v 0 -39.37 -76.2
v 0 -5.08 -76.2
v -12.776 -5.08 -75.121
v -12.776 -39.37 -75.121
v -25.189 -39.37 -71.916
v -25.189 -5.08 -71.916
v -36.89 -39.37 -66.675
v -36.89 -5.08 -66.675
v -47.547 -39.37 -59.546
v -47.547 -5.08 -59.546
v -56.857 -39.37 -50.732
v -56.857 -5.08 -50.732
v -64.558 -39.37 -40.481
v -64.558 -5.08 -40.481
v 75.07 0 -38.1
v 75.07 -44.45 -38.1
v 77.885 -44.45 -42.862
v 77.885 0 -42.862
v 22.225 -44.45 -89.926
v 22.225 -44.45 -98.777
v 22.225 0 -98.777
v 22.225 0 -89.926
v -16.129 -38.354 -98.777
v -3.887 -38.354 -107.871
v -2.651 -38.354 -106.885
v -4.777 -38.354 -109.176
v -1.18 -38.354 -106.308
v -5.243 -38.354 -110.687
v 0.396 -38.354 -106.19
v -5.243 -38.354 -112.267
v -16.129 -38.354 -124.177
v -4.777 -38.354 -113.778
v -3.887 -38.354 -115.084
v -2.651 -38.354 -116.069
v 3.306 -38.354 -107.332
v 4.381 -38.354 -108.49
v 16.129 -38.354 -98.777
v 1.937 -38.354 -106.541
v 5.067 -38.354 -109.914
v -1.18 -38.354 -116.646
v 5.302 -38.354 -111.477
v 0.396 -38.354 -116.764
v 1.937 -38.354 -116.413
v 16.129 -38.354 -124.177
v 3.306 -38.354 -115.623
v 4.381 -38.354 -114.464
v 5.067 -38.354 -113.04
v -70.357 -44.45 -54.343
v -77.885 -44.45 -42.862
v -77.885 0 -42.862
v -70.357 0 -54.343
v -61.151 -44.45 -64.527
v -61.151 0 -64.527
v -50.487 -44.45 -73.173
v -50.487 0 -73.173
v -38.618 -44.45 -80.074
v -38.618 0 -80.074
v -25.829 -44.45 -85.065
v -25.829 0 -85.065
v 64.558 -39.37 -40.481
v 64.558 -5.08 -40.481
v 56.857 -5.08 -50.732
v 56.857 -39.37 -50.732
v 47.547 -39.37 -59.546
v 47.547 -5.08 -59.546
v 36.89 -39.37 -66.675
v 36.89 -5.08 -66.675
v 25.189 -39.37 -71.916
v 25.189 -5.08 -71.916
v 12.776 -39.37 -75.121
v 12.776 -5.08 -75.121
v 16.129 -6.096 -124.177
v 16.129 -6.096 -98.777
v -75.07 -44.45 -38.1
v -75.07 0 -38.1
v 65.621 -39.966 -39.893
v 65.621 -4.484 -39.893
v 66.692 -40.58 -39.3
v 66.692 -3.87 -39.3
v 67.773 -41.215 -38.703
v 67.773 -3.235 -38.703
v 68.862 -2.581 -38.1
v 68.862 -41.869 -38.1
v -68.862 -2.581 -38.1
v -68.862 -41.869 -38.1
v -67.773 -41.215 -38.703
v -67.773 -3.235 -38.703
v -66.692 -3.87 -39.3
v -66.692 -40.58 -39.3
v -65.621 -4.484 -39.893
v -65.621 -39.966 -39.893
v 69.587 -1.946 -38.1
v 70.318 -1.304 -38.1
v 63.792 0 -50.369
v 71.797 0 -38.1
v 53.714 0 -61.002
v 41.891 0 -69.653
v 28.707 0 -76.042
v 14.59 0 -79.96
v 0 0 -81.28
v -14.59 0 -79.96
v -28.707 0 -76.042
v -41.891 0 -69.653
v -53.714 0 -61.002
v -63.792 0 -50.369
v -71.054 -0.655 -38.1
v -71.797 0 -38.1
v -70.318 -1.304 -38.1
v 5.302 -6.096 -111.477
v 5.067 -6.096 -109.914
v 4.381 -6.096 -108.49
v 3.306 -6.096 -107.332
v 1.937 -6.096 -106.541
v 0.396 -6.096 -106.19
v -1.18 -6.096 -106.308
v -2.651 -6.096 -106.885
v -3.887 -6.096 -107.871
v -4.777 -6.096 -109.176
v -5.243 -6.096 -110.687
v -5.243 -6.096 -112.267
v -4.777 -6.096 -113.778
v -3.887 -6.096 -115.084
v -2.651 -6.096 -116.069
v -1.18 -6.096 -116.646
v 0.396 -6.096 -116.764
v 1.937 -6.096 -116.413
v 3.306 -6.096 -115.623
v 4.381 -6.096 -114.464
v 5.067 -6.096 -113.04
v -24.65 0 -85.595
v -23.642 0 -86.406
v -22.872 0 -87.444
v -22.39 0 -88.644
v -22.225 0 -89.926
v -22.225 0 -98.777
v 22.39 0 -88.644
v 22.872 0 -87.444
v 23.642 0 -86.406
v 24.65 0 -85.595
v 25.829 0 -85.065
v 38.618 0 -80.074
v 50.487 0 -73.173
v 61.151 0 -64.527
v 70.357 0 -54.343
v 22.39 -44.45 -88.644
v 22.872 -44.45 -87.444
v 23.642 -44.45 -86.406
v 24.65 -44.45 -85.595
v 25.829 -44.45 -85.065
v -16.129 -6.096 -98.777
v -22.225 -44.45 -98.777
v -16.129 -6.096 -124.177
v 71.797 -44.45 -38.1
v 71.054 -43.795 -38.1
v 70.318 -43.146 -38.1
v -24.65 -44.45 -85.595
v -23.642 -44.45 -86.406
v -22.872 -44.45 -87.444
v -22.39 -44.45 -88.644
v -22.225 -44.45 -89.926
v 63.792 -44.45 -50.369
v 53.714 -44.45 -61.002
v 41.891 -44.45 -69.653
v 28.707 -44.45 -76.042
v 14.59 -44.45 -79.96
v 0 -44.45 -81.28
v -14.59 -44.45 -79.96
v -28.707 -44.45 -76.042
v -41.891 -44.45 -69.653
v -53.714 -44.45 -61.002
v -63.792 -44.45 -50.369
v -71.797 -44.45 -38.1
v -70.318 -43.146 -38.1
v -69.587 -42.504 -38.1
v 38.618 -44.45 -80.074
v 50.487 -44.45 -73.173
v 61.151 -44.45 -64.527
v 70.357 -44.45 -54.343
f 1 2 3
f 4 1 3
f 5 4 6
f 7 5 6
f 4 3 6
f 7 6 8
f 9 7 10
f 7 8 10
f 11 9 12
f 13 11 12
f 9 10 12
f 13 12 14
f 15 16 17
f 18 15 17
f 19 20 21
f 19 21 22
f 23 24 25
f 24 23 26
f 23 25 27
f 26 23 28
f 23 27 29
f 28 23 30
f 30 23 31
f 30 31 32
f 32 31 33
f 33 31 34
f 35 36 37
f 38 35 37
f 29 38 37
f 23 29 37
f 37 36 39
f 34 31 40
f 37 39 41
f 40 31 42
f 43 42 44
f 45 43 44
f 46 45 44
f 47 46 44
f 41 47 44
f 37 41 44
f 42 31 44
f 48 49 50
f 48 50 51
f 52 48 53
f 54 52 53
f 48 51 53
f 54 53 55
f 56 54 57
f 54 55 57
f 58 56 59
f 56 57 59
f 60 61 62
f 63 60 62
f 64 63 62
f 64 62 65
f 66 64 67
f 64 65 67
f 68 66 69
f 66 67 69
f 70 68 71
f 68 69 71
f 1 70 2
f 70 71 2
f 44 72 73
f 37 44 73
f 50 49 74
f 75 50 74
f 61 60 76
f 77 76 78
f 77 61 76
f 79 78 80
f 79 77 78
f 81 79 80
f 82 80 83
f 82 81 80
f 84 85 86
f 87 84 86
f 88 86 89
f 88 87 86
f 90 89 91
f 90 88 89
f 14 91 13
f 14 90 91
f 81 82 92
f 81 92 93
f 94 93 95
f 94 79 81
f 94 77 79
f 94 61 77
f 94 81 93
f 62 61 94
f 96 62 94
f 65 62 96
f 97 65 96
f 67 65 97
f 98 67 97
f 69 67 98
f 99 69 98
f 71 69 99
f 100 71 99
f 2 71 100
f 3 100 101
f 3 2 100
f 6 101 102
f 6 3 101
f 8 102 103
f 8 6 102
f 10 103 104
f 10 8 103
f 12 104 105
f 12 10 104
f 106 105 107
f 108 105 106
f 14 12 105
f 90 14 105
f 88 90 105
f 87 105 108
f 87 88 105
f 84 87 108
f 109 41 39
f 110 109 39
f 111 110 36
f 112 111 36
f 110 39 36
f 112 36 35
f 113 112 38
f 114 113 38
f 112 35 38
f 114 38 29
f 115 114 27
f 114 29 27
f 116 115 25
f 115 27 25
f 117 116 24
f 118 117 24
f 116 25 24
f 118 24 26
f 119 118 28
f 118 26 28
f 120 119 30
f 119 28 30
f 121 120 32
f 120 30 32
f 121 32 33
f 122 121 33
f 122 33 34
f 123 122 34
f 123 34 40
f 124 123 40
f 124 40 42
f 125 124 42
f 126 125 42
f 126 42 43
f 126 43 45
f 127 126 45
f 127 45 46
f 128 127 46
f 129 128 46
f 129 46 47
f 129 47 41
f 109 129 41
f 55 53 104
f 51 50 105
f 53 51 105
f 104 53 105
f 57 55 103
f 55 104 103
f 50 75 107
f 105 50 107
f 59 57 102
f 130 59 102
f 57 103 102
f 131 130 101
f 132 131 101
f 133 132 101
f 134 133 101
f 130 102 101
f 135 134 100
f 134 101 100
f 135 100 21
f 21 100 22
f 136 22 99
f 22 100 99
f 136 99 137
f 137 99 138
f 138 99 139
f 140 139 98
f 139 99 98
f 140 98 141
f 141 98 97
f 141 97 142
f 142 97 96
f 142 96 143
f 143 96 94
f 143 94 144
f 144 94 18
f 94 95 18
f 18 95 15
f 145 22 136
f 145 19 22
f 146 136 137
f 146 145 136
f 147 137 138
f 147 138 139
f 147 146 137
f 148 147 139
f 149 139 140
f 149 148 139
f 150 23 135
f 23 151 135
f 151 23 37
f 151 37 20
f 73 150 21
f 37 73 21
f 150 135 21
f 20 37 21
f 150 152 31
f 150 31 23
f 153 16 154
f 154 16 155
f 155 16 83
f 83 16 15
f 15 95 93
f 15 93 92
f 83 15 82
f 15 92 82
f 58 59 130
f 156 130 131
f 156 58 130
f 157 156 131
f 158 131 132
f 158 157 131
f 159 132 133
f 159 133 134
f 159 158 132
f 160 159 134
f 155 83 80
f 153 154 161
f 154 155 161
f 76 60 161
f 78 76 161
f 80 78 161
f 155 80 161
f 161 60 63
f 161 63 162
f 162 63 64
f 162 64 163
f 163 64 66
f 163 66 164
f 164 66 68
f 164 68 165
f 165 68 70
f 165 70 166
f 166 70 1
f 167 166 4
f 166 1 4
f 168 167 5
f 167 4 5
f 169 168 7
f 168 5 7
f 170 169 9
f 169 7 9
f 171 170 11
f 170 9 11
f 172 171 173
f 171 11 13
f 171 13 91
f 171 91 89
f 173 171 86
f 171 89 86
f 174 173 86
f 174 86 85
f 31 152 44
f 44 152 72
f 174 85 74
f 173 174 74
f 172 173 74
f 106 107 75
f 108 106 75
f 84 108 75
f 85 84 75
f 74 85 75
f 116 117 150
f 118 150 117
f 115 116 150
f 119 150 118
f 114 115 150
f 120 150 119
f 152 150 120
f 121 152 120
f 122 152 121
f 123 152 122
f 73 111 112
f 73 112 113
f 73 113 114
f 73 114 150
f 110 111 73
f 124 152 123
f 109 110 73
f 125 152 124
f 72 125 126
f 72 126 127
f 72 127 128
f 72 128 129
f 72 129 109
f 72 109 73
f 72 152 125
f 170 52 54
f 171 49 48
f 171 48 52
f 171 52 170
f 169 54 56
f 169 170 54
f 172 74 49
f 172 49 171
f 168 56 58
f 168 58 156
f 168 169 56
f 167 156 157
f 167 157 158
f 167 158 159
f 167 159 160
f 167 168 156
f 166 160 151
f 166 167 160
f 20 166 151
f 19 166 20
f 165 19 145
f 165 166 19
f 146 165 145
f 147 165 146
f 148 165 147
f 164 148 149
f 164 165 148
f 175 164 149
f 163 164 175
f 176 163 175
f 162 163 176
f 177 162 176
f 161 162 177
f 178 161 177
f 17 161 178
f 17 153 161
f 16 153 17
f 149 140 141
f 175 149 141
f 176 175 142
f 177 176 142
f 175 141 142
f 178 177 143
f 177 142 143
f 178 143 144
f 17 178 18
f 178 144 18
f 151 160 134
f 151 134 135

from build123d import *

# Parameters (mm, degrees)
F0_W        = 16.129
F0_H        = 25.4
F1_DEPTH    = 44.45
F2_W        = 32.258
F2_H        = 6.096
F3_DEPTH    = 25.4
F4_R        = 5.30225
F5_DEPTH    = 38.355
F6_R        = 5.08
F7_T1_DEPTH = 59.6994752683
F7_T4_ANGLE = 139.6602442287
F7_T6_ANGLE = 139.6602442287
F8_T1_DEPTH = 71.752763855


# Not quite as in the source:
# - a fillet or chamfer that OpenCascade refuses, or shapes differently, is made with other operations: its cross-section is extruded or revolved along the edge and cut away or added


with BuildPart() as f1:
    # F0 (on Front) → F1 (new body)
    with BuildSketch(Plane.XZ):
        with BuildLine():
            ThreePointArc((0, -76.2), (-38.1, -65.9911357684), (-65.9911357684, -38.1))
            Line((-65.9911357684, -38.1), (-80.3218525683, -38.1))
            ThreePointArc((-80.3218525683, -38.1), (-56.6075409411, -68.5477666201), (-22.225, -86.0770548695))
            Line((-22.225, -86.0770548695), (0, -86.0770548695))
            Line((0, -86.0770548695), (0, -76.2))
        make_face()
        with BuildLine():
            Line((80.3218525683, -38.1), (65.9911357684, -38.1))
            ThreePointArc((65.9911357684, -38.1), (38.1, -65.9911357684), (0, -76.2))
            Line((0, -76.2), (0, -86.0770548695))
            Line((0, -86.0770548695), (22.225, -86.0770548695))
            ThreePointArc((22.225, -86.0770548695), (56.6075409411, -68.5477666201), (80.3218525683, -38.1))
        make_face()
        with BuildLine():
            Line((22.225, -98.7770548695), (22.225, -86.0770548695))
            ThreePointArc((22.225, -86.0770548695), (11.2017816017, -88.1914399982), (0, -88.9))
            Line((0, -88.9), (0, -98.7770548695))
            Line((0, -98.7770548695), (16.129, -98.7770548695))
            Line((16.129, -98.7770548695), (22.225, -98.7770548695))
        make_face()
        with BuildLine():
            ThreePointArc((0, -88.9), (-11.2017816017, -88.1914399982), (-22.225, -86.0770548695))
            Line((-22.225, -86.0770548695), (-22.225, -98.7770548695))
            Line((-22.225, -98.7770548695), (-16.129, -98.7770548695))
            Line((-16.129, -98.7770548695), (0, -98.7770548695))
            Line((0, -98.7770548695), (0, -88.9))
        make_face()
        with Locations((8.0645, -111.4770548695)):
            Rectangle(F0_W, F0_H)
        with Locations((-8.0645, -111.4770548695)):
            Rectangle(F0_W, F0_H)
        with BuildLine():
            Line((22.225, -86.0770548695), (0, -86.0770548695))
            Line((0, -86.0770548695), (0, -88.9))
            ThreePointArc((0, -88.9), (11.2017816017, -88.1914399982), (22.225, -86.0770548695))
        make_face()
        with BuildLine():
            Line((0, -88.9), (0, -86.0770548695))
            Line((0, -86.0770548695), (-22.225, -86.0770548695))
            ThreePointArc((-22.225, -86.0770548695), (-11.2017816017, -88.1914399982), (0, -88.9))
        make_face()
    extrude(amount=F1_DEPTH)

    # F2 (on face) → F3 (cut)
    with BuildSketch(Plane(origin=(0, 0, -124.1770548695), x_dir=(1, 0, 0), z_dir=(0, 0, -1))):
        with Locations((0, 41.402)):
            Rectangle(F2_W, F2_H)
        with Locations((0, 3.048)):
            Rectangle(F2_W, F2_H)
    extrude(amount=-F3_DEPTH, mode=Mode.SUBTRACT)

    # F4 (on face) → F5 (cut, through all)
    with BuildSketch(Plane.XZ.offset(38.354)):
        with Locations((0, -111.4770548695)):
            Circle(F4_R)
    extrude(amount=-F5_DEPTH, mode=Mode.SUBTRACT)

    # F6
    f6_edges = [f1.edges().sort_by_distance(p)[0] for p in [
        (-22.225, -22.225, -86.077055),
        (22.225, -22.225, -86.077055),
    ]]
    fillet(f6_edges, radius=F6_R)

    # F7: chamfer of 5.08 on 4 edges, made by hand

    # F7_s2 → F7_t1 (cut)
    with BuildSketch(Plane.XZ.offset(-7.6247376341)):
        with BuildLine():
            Line((-68.8616438956, -38.1), (-64.5577911521, -40.48125))
            ThreePointArc((-64.5577911521, -40.48125), (-65.2398633811, -39.3725821609), (-65.9911357684, -38.1))
            Line((-65.9911357684, -38.1), (-68.8616438956, -38.1))
        make_face()
        with BuildLine():
            Line((64.5577911521, -40.48125), (68.8616438956, -38.1))
            Line((68.8616438956, -38.1), (65.9911357684, -38.1))
            ThreePointArc((65.9911357684, -38.1), (65.2398633811, -39.3725821609), (64.5577911521, -40.48125))
        make_face()
    extrude(amount=F7_T1_DEPTH, mode=Mode.SUBTRACT)

    # F7_s3 → F7_t4 (revolve, cut)
    with BuildSketch(Plane(origin=(0, 0, 0), x_dir=(0, 1, 0), z_dir=(0.3448047573, 0, 0.9386744267))):
        Polygon((-44.45, -81.28), (-39.37, -76.2), (-44.45, -76.2), align=None)
    revolve(axis=Axis((0, -44.45, 0), (0, 1, 0)), revolution_arc=F7_T4_ANGLE, mode=Mode.SUBTRACT)

    # F7_s5 → F7_t6 (revolve, cut)
    with BuildSketch(Plane(origin=(0, 0, 0), x_dir=(0, 1, 0), z_dir=(0.3448047573, 0, 0.9386744267))):
        Polygon((0, -81.28), (-5.08, -76.2), (0, -76.2), align=None)
    revolve(axis=Axis((0, 0, 0), (0, 1, 0)), revolution_arc=F7_T6_ANGLE, mode=Mode.SUBTRACT)

    # F8: chamfer of 5.08 on 2 edges, made by hand

    # F8_s2 → F8_t1 (cut)
    with BuildSketch(Plane.XZ.offset(-13.6513819275)):
        with BuildLine():
            Line((74.966768006, -37.9250746392), (77.988352908, -43.0368427057))
            Line((77.988352908, -43.0368427057), (78.0773642839, -43.0858277541))
            ThreePointArc((78.0773642839, -43.0858277541), (79.2049019091, -40.5939443284), (80.4136489712, -38.1435428571))
            Line((80.4136489712, -38.1435428571), (80.3218525683, -37.9984))
            ThreePointArc((80.3218525683, -37.9984), (77.6443102871, -37.9984), (74.966768006, -37.8234746392))
            Line((74.966768006, -37.8234746392), (74.966768006, -37.9250746392))
        make_face()
        with BuildLine():
            Line((-77.988352908, -43.0368427057), (-74.966768006, -37.9250746392))
            Line((-74.966768006, -37.9250746392), (-74.966768006, -37.8234746392))
            ThreePointArc((-74.966768006, -37.8234746392), (-77.6443102871, -37.9984), (-80.3218525683, -37.9984))
            Line((-80.3218525683, -37.9984), (-80.4136489712, -38.1435428571))
            ThreePointArc((-80.4136489712, -38.1435428571), (-79.2049019091, -40.5939443284), (-78.0773642839, -43.0858277541))
            Line((-78.0773642839, -43.0858277541), (-77.988352908, -43.0368427057))
        make_face()
    extrude(amount=F8_T1_DEPTH, mode=Mode.SUBTRACT)


solid = f1.part
